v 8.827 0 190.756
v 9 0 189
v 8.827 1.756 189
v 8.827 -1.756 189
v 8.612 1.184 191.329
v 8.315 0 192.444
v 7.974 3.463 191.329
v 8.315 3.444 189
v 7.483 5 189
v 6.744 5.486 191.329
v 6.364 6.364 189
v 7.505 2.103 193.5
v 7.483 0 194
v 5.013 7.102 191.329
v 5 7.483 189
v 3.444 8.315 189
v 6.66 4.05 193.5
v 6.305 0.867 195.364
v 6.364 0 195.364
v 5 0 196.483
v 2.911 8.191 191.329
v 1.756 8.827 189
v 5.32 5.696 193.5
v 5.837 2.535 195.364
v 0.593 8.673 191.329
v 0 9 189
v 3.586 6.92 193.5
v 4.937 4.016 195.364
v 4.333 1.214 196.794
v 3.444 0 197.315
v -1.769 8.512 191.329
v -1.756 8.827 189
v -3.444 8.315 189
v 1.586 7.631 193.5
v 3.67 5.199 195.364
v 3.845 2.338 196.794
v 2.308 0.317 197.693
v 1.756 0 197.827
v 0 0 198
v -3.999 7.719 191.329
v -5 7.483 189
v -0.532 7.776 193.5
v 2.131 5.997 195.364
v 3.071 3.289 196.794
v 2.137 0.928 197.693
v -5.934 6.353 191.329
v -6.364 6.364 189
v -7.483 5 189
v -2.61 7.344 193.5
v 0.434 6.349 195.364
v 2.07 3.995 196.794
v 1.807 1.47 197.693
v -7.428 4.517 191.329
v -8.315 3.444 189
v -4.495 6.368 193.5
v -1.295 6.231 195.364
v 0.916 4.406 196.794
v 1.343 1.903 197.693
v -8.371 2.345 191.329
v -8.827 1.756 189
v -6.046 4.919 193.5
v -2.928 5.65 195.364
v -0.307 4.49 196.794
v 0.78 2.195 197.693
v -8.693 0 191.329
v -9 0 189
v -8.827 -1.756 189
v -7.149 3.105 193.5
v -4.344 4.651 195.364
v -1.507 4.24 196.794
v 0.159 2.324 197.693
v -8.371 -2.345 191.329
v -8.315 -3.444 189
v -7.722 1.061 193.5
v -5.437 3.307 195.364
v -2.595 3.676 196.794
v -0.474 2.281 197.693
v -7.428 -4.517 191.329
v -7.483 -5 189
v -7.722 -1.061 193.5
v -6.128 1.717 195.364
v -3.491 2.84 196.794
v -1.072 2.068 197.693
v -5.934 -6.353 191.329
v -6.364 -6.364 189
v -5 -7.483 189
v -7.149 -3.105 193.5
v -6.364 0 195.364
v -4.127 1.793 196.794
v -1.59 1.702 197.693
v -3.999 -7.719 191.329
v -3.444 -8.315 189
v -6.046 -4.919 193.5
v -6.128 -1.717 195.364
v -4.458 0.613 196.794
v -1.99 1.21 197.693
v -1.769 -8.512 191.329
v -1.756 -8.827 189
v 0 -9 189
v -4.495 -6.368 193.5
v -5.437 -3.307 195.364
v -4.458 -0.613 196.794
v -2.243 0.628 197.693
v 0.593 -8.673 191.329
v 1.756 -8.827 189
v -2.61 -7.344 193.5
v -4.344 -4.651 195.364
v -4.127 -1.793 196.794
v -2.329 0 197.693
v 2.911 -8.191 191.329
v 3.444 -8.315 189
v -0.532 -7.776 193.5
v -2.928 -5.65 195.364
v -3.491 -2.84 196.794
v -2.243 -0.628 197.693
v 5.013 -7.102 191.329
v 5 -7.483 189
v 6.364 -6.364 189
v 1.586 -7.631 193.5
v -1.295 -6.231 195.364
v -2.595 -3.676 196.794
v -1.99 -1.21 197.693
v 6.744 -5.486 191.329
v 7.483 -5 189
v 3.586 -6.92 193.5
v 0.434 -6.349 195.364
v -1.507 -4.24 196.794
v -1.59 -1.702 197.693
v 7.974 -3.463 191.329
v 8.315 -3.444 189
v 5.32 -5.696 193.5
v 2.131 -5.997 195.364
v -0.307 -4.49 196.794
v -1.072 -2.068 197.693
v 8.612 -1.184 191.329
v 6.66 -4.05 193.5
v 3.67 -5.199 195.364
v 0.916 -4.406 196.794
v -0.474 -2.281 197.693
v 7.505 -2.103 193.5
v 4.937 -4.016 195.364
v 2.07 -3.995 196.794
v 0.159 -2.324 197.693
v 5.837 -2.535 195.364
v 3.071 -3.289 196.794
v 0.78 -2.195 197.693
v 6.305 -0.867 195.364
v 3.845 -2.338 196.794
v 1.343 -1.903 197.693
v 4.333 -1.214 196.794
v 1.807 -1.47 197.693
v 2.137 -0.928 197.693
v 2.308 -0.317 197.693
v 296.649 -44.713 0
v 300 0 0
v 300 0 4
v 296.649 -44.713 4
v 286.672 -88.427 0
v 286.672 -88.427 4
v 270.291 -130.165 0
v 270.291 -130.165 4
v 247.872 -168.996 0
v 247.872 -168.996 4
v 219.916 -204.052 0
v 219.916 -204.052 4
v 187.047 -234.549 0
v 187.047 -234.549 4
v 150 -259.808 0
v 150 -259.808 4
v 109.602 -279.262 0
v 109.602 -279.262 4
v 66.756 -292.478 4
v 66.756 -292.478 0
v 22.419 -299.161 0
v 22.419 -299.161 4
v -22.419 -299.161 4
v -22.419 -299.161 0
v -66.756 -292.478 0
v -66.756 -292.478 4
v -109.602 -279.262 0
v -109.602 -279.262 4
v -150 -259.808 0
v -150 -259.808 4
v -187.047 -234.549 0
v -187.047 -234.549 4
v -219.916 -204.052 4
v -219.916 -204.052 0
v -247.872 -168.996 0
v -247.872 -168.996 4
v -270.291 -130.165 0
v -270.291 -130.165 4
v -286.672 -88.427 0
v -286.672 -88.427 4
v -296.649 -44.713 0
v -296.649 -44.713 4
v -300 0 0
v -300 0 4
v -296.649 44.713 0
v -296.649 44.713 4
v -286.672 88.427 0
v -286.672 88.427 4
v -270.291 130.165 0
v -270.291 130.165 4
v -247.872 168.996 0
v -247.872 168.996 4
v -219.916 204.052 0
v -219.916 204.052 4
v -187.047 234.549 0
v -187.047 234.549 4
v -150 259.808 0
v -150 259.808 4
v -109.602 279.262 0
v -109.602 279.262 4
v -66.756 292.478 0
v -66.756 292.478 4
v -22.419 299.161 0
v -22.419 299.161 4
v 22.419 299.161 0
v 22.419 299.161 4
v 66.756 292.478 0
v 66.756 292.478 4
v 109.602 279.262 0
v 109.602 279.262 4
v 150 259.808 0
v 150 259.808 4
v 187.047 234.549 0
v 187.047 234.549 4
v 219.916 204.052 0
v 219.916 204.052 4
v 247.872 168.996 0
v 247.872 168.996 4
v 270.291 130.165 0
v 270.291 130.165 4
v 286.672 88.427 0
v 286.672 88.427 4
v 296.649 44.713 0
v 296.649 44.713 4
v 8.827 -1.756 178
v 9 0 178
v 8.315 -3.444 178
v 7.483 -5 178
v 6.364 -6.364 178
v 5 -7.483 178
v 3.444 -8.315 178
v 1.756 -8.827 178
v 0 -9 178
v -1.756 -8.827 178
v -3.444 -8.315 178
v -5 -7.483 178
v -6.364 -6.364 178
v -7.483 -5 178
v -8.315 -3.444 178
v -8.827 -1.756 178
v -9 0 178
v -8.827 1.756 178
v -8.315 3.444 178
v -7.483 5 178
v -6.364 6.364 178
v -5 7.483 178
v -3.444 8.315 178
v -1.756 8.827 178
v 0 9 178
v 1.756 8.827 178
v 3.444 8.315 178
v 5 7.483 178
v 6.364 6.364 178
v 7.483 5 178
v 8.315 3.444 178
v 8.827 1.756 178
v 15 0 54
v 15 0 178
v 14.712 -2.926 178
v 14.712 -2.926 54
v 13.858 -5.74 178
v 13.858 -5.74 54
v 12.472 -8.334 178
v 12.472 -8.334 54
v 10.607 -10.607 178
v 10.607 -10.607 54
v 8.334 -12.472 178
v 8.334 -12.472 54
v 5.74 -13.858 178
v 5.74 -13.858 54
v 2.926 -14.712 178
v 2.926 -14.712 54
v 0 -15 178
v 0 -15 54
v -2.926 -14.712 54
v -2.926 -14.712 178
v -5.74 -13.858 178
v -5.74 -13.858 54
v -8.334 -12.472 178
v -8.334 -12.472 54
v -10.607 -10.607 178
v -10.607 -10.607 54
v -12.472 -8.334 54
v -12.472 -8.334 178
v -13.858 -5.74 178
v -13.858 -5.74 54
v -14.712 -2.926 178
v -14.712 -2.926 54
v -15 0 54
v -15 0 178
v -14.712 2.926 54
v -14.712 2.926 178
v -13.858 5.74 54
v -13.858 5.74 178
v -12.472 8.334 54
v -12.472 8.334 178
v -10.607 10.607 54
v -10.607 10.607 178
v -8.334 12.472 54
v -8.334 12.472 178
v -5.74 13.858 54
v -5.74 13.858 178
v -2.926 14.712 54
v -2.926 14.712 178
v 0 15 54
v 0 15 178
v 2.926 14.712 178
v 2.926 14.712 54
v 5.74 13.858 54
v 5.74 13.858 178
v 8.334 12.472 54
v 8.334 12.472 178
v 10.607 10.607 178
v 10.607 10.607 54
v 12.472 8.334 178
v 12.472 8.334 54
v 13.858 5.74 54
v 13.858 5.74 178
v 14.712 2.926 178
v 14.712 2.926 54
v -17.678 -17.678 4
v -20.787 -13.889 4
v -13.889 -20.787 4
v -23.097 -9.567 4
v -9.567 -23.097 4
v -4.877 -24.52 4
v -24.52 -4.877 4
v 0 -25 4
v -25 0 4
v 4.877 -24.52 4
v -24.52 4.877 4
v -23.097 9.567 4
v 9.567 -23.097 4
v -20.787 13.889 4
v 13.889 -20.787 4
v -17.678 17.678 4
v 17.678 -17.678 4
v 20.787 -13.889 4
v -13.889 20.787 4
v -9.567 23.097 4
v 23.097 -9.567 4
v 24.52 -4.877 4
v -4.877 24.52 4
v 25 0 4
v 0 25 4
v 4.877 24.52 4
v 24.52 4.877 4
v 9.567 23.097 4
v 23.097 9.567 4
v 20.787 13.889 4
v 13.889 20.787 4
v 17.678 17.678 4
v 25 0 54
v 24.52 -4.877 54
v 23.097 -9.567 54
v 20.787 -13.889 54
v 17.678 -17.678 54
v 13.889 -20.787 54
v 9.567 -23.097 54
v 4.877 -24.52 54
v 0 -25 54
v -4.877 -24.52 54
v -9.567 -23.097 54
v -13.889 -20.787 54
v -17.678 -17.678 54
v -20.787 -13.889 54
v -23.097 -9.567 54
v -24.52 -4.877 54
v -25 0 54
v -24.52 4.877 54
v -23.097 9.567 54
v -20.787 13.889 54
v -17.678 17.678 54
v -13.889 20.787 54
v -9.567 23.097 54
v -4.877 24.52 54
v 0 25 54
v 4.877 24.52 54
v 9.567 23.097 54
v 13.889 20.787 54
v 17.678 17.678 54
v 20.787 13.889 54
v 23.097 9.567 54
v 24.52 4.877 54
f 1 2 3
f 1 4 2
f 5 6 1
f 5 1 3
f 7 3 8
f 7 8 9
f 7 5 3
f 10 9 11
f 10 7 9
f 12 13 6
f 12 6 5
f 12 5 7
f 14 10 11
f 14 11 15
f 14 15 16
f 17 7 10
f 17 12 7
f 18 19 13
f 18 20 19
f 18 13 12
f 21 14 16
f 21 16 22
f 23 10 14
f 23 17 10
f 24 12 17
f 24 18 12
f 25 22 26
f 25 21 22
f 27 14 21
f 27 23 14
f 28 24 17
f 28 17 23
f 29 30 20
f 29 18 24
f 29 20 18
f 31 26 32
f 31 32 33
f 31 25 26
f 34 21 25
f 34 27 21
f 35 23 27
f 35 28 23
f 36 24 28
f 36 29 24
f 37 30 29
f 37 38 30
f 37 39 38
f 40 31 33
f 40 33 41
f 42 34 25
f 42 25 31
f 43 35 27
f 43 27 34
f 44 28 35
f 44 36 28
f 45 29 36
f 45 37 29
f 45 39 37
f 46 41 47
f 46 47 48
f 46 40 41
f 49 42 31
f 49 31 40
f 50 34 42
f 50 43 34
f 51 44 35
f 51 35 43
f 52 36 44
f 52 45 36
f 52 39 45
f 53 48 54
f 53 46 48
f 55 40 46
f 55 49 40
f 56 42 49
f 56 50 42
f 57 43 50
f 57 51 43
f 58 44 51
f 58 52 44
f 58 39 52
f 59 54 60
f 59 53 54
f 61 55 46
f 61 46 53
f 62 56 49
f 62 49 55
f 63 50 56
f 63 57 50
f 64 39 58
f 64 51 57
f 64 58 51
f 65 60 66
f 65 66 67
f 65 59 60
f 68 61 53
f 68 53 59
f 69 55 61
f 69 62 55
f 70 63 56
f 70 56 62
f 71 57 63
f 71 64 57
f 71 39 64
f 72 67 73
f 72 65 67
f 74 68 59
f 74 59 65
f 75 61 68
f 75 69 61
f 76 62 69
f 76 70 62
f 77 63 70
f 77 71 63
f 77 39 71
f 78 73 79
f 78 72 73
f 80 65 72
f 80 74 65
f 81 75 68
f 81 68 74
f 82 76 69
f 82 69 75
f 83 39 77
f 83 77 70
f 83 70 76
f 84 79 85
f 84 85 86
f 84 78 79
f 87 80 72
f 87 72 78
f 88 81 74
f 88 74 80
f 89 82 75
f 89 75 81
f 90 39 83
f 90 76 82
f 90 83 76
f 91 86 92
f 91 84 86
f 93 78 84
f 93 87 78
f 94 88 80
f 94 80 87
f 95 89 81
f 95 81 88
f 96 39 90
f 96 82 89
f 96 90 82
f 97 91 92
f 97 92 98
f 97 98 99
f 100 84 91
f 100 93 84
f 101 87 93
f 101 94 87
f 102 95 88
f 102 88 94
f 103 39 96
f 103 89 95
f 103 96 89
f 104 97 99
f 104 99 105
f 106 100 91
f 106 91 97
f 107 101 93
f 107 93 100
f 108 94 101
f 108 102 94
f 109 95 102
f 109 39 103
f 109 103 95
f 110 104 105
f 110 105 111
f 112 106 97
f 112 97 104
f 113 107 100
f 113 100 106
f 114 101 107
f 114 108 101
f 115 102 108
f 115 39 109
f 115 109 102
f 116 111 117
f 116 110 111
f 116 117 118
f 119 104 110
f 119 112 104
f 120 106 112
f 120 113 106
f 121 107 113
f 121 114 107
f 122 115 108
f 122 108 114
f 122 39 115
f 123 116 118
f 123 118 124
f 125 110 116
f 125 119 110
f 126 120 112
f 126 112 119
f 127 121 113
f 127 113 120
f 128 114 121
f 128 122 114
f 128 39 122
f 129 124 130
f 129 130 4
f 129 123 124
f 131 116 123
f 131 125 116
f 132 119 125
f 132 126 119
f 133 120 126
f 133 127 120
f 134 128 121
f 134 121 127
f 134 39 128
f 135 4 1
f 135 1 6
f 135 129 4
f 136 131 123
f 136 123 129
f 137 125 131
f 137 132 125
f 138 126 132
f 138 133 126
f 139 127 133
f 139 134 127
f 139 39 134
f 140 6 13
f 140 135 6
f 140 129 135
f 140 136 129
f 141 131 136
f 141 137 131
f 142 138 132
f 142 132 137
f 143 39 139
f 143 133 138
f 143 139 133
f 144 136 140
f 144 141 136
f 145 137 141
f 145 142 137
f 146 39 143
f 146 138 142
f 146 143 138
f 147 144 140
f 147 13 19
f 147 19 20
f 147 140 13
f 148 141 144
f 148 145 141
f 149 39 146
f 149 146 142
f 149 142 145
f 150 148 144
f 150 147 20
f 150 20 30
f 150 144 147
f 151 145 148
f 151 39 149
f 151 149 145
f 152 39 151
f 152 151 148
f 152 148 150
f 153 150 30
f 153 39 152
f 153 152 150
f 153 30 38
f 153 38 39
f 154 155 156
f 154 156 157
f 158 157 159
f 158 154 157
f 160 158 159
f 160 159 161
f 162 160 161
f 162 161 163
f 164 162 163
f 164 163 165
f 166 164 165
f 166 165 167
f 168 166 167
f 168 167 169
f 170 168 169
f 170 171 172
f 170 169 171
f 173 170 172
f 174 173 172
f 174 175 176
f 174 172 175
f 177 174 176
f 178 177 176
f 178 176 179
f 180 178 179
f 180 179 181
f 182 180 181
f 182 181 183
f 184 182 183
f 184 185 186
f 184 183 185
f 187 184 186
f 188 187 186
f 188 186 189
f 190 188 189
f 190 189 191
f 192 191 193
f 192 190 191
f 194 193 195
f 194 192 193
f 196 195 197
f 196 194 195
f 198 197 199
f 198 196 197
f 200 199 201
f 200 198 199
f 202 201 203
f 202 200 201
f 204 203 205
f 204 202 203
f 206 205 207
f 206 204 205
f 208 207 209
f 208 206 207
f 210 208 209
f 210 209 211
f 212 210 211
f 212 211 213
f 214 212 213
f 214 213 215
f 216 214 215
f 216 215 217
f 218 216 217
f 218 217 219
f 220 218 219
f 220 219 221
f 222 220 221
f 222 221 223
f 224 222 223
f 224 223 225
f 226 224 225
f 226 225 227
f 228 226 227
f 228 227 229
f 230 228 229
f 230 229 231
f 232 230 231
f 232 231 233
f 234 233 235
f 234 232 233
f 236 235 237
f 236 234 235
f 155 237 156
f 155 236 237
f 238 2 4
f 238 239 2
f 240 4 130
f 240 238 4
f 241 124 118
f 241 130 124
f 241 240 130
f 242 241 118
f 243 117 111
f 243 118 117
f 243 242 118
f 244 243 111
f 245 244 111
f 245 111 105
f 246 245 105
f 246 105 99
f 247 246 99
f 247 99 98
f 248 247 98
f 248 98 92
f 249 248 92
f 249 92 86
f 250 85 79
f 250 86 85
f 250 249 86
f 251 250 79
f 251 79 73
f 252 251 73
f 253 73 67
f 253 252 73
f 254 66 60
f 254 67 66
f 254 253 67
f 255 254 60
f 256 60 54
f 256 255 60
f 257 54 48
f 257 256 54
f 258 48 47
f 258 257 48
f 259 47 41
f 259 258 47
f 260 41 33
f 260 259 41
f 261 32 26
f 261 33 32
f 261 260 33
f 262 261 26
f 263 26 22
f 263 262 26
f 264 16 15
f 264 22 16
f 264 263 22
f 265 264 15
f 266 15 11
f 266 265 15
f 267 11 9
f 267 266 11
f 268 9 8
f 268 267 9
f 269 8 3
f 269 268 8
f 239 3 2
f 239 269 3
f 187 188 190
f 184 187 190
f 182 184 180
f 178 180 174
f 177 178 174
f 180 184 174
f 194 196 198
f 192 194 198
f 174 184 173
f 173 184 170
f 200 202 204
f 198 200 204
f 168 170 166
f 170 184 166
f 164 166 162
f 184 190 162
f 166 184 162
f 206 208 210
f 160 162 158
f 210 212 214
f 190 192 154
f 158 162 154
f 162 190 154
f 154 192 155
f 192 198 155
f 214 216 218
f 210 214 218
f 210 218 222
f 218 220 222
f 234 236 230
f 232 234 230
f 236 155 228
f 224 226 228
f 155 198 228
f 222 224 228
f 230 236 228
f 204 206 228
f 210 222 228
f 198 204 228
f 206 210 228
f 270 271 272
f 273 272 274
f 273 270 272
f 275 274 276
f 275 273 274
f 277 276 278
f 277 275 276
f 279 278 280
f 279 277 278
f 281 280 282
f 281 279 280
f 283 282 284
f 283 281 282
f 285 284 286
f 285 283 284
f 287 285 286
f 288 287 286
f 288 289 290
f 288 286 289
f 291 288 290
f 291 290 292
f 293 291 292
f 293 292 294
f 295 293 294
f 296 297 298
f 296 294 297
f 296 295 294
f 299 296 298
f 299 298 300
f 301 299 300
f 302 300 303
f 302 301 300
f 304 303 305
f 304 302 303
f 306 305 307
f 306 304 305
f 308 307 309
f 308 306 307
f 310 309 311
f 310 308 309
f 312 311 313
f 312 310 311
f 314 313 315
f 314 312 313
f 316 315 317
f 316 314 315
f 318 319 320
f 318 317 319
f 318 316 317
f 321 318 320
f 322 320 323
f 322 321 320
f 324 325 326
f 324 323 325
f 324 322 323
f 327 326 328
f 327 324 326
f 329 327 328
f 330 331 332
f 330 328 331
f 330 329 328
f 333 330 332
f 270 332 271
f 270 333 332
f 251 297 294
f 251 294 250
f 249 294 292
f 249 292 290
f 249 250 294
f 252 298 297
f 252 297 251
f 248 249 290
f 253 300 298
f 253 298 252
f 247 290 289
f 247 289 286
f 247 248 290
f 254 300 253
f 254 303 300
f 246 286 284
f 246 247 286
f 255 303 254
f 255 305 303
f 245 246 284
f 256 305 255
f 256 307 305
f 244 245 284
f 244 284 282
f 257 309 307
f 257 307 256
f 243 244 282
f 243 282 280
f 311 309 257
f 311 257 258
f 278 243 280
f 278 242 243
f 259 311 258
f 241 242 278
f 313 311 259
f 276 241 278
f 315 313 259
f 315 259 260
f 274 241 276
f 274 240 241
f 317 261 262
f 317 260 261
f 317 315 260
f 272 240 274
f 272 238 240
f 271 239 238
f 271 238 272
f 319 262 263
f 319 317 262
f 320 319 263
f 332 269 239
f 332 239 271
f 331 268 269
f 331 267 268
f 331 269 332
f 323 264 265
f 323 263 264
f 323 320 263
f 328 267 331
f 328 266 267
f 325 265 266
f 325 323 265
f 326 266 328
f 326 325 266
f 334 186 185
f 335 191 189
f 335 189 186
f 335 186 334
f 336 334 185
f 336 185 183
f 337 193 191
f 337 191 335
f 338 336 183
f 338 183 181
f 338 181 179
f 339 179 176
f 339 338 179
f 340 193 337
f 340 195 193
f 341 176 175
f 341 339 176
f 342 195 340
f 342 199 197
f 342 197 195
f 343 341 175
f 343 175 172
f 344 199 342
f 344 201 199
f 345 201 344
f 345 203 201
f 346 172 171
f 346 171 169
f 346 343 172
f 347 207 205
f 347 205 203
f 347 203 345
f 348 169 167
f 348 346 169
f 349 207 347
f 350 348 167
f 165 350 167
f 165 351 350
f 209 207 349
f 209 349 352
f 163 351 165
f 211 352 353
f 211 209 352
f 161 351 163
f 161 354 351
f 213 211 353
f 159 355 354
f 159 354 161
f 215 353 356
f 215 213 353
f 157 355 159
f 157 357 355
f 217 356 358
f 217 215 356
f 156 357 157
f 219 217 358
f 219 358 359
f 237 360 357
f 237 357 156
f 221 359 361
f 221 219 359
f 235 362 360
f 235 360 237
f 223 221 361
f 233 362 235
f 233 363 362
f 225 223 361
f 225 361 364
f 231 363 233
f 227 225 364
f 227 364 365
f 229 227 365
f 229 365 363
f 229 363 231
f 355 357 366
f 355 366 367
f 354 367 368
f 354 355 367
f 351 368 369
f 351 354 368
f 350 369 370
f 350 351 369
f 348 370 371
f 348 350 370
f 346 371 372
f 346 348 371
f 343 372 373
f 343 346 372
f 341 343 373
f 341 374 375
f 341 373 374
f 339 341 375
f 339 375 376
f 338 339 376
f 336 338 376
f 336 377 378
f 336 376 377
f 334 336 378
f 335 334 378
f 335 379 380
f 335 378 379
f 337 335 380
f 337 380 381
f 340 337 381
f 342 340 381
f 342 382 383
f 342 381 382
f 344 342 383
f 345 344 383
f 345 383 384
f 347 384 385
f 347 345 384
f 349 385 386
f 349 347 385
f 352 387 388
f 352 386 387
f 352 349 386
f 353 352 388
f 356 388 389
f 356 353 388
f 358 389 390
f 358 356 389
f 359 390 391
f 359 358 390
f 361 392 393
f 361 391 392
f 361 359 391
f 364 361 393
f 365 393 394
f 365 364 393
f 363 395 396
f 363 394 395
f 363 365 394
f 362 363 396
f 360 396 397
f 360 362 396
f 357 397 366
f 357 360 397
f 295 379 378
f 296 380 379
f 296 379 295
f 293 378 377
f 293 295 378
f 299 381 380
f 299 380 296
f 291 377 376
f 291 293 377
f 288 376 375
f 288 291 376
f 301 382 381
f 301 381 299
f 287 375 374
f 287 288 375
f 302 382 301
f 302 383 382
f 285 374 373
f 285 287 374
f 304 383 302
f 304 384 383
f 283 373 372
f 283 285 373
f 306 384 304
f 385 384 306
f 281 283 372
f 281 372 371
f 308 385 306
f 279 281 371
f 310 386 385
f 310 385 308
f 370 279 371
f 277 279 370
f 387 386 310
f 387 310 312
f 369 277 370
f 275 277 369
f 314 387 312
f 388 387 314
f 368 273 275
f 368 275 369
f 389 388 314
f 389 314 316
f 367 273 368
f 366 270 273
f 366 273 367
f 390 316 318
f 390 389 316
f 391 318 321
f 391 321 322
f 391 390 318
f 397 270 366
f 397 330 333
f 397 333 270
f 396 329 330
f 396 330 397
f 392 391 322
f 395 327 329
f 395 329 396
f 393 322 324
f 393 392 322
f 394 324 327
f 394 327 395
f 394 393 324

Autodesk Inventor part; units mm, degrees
ref_plane "YZ Plane" through (0, 0, 0) normal (1, 0, 0) x (0, 1, 0)
ref_plane "XZ Plane" through (0, 0, 0) normal (0, 1, 0) x (-1, 0, 0)
ref_plane "XY Plane" through (0, 0, 0) normal (0, 0, 1) x (1, 0, 0)
sketch "Sketch1" plane through (0, 0, 0) normal (0, 0, 1) x (1, 0, 0)
  circle A0 centre (0, 0) radius 300
  dimension "d0" = 600
extrude "Extrusion1" add sketch "Sketch1" along normal blind 4
sketch "Sketch2" plane through (0, 0, 4) normal (0, 0, 1) x (1, 0, 0)
  circle A0 centre (0, 0) radius 300 projected
  circle A1 centre (0, 0) radius 25
  circle A2 centre (0, 0) radius 15
  dimension "d3" = 50
  dimension "d4" = 30
extrude "Extrusion2" add sketch "Sketch2" along normal blind 50 contours A1 | A2
extrude "Extrusion3" add sketch "Sketch2" along normal blind 174 contours A2
sketch "Sketch3" plane through (0, 0, 178) normal (0, 0, 1) x (1, 0, 0)
  circle A0 centre (0, 0) radius 15 projected
  circle A1 centre (0, 0) radius 9
  dimension "d9" = 18
extrude "Extrusion4" add sketch "Sketch3" along normal blind 20 contours A1
fillet "Fillet1" radius 9 1 edges at (-9, 0, 198)
sketch "Sketch4" plane through (0, 0, 4) normal (0, 0, 1) x (1, 0, 0)
  circle A0 centre (0, 0) radius 25 projected
  circle A1 centre (0, 0) radius 300 projected
  line L0 (0, 0) -> (0, 300)
  line L1 (0, 0) -> (0, -300)
  line L2 (0, 0) -> (300, 0)
properties part number "lilin + dudukan + alas"
